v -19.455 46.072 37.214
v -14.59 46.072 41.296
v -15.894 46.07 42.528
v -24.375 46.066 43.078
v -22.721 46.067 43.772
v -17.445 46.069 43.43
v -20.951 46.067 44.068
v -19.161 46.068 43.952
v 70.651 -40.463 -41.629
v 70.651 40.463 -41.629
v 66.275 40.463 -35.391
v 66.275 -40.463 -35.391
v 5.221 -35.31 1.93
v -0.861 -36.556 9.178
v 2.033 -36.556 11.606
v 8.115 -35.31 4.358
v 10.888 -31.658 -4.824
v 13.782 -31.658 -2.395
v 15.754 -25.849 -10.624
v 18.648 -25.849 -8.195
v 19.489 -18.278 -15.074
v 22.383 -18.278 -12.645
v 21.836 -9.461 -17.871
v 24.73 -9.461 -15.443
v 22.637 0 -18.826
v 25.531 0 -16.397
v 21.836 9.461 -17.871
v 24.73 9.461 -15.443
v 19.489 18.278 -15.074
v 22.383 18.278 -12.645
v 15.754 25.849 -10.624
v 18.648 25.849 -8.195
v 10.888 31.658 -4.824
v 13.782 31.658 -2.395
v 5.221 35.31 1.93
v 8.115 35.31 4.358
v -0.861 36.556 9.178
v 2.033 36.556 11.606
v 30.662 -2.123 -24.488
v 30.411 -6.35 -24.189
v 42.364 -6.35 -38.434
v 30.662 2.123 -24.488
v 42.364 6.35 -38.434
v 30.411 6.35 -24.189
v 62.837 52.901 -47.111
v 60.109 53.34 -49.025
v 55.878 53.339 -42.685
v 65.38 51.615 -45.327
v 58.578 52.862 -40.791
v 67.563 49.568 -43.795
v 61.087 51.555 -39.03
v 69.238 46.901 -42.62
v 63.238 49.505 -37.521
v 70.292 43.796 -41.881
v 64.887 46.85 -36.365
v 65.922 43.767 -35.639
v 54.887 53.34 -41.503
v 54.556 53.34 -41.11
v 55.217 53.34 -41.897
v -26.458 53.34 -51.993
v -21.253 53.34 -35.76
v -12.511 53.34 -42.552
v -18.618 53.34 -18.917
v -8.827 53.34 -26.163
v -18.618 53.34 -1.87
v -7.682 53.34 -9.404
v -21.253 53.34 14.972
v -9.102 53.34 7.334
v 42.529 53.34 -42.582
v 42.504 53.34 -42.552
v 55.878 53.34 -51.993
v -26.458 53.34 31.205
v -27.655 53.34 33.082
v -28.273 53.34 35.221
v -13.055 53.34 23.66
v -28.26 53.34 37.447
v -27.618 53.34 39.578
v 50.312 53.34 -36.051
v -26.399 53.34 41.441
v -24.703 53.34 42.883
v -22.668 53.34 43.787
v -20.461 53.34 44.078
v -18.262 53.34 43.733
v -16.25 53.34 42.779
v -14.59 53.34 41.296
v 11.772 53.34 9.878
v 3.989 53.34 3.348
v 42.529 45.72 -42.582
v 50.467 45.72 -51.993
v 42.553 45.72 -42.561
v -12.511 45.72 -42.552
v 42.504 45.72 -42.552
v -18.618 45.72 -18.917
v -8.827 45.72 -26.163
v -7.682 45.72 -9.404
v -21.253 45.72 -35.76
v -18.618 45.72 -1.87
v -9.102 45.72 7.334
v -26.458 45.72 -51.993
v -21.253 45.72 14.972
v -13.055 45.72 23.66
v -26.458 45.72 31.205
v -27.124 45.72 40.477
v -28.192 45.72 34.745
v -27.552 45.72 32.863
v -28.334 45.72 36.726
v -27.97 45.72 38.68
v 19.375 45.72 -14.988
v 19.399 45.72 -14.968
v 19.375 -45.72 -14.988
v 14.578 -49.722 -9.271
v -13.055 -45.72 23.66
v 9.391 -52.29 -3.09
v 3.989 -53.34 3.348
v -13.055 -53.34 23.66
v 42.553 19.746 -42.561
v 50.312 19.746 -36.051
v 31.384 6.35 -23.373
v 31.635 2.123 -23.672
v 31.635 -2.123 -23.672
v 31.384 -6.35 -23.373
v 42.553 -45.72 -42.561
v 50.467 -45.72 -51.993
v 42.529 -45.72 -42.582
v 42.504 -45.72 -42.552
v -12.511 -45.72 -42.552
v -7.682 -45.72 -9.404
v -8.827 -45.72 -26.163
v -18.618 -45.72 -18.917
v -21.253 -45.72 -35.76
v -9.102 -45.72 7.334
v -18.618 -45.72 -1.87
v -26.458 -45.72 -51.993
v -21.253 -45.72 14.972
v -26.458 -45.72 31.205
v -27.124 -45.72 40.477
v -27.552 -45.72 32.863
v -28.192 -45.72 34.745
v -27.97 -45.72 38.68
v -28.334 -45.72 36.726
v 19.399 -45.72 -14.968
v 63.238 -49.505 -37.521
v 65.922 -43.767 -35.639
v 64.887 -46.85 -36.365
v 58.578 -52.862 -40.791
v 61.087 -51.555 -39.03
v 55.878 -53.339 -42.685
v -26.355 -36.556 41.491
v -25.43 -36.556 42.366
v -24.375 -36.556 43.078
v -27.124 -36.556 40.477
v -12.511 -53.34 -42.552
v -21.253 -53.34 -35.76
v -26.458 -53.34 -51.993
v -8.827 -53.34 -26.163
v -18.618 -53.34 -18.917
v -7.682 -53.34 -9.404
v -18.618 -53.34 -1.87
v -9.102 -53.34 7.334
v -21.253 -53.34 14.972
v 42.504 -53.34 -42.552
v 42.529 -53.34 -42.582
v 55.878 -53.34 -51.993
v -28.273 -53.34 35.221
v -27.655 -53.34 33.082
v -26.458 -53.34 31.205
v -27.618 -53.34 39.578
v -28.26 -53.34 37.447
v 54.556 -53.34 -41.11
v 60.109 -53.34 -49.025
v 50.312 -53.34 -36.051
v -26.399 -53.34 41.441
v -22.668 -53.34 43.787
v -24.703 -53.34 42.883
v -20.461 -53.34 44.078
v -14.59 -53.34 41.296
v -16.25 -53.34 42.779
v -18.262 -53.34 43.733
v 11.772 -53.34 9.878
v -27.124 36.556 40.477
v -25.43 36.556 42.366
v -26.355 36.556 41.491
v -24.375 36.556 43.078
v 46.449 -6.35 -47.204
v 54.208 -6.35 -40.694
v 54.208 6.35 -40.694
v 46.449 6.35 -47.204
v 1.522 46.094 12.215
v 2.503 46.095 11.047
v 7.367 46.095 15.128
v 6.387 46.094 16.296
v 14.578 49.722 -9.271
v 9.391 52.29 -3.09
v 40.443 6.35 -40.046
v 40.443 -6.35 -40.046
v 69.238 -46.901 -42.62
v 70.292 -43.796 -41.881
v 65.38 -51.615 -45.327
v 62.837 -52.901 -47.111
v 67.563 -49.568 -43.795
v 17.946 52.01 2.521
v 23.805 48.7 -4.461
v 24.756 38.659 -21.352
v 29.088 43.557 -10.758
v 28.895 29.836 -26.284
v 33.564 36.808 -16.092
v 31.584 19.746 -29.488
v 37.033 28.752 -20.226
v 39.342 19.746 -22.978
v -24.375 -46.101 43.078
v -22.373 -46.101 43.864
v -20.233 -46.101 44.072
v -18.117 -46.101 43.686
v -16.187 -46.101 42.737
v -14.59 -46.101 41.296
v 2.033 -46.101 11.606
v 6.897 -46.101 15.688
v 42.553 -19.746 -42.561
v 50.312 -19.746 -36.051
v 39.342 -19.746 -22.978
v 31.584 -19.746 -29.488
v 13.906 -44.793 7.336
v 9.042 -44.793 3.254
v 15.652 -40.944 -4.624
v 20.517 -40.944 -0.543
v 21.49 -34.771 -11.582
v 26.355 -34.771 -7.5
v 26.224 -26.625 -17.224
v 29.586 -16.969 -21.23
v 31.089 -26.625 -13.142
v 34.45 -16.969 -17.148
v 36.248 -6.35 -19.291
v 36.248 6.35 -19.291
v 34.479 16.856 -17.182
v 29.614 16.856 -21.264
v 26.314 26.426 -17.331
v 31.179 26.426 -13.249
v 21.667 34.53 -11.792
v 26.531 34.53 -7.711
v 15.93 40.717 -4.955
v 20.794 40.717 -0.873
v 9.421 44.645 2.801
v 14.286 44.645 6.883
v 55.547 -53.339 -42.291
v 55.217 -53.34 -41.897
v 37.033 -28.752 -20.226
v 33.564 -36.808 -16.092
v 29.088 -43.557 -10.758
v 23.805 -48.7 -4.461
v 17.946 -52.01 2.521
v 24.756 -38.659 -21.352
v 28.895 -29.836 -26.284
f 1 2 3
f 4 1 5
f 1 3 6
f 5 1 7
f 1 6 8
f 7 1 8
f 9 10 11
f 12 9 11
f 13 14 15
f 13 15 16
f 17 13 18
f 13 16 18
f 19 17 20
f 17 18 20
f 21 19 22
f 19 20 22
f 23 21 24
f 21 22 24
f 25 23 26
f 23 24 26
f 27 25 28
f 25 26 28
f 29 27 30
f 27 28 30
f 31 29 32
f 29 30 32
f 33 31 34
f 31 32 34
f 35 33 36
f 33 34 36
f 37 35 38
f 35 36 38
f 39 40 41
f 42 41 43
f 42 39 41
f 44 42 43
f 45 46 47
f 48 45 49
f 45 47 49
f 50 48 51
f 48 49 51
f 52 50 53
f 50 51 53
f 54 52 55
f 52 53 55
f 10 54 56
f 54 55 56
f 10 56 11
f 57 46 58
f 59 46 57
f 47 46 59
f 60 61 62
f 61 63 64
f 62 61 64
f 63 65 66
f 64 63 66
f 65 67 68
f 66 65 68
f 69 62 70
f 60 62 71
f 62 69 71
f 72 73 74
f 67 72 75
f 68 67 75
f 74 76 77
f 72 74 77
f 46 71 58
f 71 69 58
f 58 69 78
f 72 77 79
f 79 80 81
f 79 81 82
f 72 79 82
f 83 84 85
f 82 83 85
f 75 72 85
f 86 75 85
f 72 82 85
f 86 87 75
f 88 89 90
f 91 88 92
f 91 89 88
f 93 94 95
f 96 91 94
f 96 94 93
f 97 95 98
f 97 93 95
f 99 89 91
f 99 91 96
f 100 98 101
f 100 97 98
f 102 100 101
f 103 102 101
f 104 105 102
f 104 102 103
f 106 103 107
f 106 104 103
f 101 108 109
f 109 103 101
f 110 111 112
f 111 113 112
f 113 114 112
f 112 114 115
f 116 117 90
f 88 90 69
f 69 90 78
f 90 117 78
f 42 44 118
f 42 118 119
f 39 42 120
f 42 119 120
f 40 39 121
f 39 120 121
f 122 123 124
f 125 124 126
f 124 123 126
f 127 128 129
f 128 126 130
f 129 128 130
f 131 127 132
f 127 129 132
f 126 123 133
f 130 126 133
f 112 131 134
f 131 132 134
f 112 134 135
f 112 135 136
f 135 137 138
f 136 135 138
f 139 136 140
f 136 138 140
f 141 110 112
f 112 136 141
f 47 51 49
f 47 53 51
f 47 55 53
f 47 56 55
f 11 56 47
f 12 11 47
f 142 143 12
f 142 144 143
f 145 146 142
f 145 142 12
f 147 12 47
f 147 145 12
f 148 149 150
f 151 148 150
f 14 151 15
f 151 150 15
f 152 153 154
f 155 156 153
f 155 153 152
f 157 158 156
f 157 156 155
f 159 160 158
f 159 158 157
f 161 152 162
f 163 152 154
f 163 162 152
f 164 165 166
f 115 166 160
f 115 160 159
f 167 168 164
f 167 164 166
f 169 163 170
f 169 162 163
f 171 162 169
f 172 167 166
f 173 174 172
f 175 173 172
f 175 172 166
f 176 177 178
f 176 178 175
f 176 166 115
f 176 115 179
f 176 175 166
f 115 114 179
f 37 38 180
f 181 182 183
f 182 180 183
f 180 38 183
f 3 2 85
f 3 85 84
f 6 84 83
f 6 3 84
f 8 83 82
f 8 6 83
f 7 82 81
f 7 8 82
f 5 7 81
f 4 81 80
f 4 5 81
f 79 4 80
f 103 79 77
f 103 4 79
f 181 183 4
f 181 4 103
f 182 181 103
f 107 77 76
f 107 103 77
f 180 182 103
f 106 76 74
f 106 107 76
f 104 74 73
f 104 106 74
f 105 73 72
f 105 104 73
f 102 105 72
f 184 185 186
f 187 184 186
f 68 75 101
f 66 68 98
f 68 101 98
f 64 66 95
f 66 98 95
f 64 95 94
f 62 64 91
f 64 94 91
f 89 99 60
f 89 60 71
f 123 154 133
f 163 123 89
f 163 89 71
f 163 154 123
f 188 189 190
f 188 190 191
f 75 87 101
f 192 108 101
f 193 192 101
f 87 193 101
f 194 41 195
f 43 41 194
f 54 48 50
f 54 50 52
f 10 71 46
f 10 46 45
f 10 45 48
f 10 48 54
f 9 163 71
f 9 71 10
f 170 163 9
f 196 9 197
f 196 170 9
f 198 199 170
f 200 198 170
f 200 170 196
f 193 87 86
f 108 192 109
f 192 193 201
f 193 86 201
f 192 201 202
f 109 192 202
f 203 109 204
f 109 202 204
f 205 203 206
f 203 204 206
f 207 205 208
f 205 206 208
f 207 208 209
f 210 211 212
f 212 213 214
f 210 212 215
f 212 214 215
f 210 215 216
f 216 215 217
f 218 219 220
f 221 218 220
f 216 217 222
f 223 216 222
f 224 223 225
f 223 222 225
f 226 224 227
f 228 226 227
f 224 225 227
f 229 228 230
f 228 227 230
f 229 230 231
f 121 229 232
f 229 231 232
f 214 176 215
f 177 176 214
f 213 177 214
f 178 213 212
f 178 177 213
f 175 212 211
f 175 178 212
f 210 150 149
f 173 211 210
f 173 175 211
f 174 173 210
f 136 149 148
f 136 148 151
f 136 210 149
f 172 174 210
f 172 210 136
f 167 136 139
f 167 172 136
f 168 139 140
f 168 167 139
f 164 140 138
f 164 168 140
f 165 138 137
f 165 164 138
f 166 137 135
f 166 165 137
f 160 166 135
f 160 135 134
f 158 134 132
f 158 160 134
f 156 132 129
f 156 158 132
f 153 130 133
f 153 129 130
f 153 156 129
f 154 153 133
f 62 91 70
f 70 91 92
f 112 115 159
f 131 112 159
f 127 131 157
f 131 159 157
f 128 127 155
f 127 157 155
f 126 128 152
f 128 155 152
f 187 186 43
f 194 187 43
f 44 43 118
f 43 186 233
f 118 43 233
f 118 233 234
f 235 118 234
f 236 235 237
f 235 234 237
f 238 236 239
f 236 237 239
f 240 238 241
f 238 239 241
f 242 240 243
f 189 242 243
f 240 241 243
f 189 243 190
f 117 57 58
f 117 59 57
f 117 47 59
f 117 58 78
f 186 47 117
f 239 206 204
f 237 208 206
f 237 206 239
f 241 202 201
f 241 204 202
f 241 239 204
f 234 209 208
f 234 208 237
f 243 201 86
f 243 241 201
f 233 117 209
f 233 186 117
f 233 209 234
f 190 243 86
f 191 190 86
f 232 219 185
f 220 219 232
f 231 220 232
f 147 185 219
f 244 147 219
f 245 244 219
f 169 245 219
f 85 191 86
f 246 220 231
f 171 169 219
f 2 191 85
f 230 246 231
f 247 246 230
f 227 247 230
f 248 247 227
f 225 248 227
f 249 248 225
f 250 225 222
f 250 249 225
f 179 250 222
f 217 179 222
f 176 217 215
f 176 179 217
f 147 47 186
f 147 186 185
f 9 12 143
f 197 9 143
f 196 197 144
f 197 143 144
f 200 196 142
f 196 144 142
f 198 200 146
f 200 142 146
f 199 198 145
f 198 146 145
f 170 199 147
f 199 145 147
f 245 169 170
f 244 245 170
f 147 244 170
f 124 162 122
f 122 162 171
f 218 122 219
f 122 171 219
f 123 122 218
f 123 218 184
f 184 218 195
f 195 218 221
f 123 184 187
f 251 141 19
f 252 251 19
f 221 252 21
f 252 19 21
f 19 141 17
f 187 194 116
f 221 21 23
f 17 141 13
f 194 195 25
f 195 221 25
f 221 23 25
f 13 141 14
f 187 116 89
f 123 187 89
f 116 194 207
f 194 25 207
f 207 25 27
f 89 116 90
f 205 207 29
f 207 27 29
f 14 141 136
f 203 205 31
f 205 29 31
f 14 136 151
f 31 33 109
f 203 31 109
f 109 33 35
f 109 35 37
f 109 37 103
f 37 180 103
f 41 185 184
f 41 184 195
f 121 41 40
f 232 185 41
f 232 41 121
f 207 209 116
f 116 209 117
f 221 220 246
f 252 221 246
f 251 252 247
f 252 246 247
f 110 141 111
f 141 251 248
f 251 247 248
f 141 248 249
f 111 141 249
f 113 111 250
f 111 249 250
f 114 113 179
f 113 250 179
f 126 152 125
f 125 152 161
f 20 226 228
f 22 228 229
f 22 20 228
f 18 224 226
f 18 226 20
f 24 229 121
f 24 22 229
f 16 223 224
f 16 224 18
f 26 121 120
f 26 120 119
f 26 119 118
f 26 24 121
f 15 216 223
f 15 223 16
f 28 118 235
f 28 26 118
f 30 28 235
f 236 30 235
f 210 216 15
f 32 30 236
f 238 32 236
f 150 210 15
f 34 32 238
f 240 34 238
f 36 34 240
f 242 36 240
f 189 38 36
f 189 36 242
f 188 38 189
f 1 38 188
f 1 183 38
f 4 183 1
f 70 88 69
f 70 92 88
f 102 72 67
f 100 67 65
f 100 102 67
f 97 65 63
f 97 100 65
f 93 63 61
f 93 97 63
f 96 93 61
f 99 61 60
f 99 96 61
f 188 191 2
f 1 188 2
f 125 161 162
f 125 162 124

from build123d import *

# Parameters (mm, degrees)
F1_DEPTH  = 53.34
F2_W      = 9.5451793726
F2_H      = 32.1946403572
F3_DEPTH  = 6.35
F2_W_2    = 12.7
F2_H_2    = 9.3445232351
F4_DEPTH  = 7.62
F6_DEPTH  = 106.68
F8_W      = 91.44
F8_H      = 183.6228075896
F9_DEPTH  = 58.928
F10_DEPTH = 25.4
F11_DEPTH = 70.503420446
F12_R     = 12.8774151417
F13_DEPTH = 10.16


# Not quite as in the source:
# - a feature names something its author has since deleted; it is built from what else it names


with BuildPart() as f1:
    # F0 (on Front) → F1 (new body, symmetric)
    with BuildSketch(Plane.XZ):
        with BuildLine():
            ThreePointArc((-26.4580316219, 31.2050478526), (-18.2875299748, -10.3937397156), (-26.4580316219, -51.9925272838))
            Line((-26.4580316219, -51.9925272838), (55.8778569108, -51.9925272838))
            Line((55.8778569108, -51.9925272838), (70.650836429, -41.6293909539))
            Line((70.650836429, -41.6293909539), (66.2748063527, -35.3912212887))
            Line((66.2748063527, -35.3912212887), (55.8778569108, -42.6846047493))
            Line((55.8778569108, -42.6846047493), (-14.5902915946, 41.2960643955))
            ThreePointArc((-14.5902915946, 41.2960643955), (-25.6027276184, 42.2233043466), (-26.4580316219, 31.2050478526))
        make_face()
    extrude(amount=F1_DEPTH, both=True)

    # F2 (on face) → F3 (cut)
    with BuildSketch(Plane(origin=(11.772407622, 0, 9.8782228937), x_dir=(0, 1, 0), z_dir=(0.7660444431, 0, 0.6427876097))):
        with BuildLine():
            ThreePointArc((-36.5558206274, 35.6727858321), (-43.6495251277, 22.4172118106), (-46.101, 7.584101647))
            Line((-46.101, 7.584101647), (-36.5558206274, 7.584101647))
            Line((-36.5558206274, 7.584101647), (-36.5558206274, 35.6727858321))
        make_face()
        with BuildLine():
            Line((36.5558206274, 41.0130793115), (36.5558206274, 35.6727858321))
            ThreePointArc((36.5558206274, 35.6727858321), (43.5201114475, 22.7927209334), (46.0941562407, 8.3784324728))
            Line((46.0941562407, 8.3784324728), (46.0716254282, 41.0130793115))
            Line((46.0716254282, 41.0130793115), (36.5558206274, 41.0130793115))
        make_face()
        with BuildLine():
            Line((-36.5558206274, 41.0130793115), (-31.7459549124, 41.0130793115))
            ThreePointArc((-31.7459549124, 41.0130793115), (-17.0908294369, 50.4000536994), (0, 53.685101647))
            Line((0, 53.685101647), (0, 73.2077196687))
            Line((0, 73.2077196687), (-36.5558206274, 73.2077196687))
            Line((-36.5558206274, 73.2077196687), (-36.5558206274, 41.0130793115))
        make_face()
        with Locations((-41.3284103137, 57.1103994901)):
            Rectangle(F2_W, F2_H)
        Polygon((36.5558206274, 73.1040577223), (36.5558206274, 41.0130793115), (46.0716254282, 41.0130793115), (46.0494885484, 73.0771363708), align=None)
        with BuildLine():
            ThreePointArc((0, 53.685101647), (-17.0908294369, 50.4000536994), (-31.7459549124, 41.0130793115))
            Line((-31.7459549124, 41.0130793115), (-14.7929535268, 41.0130793115))
            ThreePointArc((-14.7929535268, 41.0130793115), (-7.5599044465, 43.3496698167), (0, 44.1399222744))
            Line((0, 44.1399222744), (0, 53.685101647))
        make_face()
        with BuildLine():
            ThreePointArc((31.7459549124, 41.0130793115), (17.0908294369, 50.4000536994), (0, 53.685101647))
            Line((0, 53.685101647), (0, 44.1399222744))
            ThreePointArc((0, 44.1399222744), (7.5599044465, 43.3496698167), (14.7929535268, 41.0130793115))
            Line((14.7929535268, 41.0130793115), (31.7459549124, 41.0130793115))
        make_face()
        with BuildLine():
            Line((-46.101, 41.0130793115), (-46.101, 7.584101647))
            ThreePointArc((-46.101, 7.584101647), (-43.6495251277, 22.4172118106), (-36.5558206274, 35.6727858321))
            Line((-36.5558206274, 35.6727858321), (-36.5558206274, 41.0130793115))
            Line((-36.5558206274, 41.0130793115), (-46.101, 41.0130793115))
        make_face()
        with BuildLine():
            Line((0, 73.2077196687), (0, 53.685101647))
            ThreePointArc((0, 53.685101647), (17.0908294369, 50.4000536994), (31.7459549124, 41.0130793115))
            Line((31.7459549124, 41.0130793115), (36.5558206274, 41.0130793115))
            Line((36.5558206274, 41.0130793115), (36.5558206274, 73.1040577223))
            Line((36.5558206274, 73.1040577223), (0, 73.2077196687))
        make_face()
        with BuildLine():
            Line((-36.5558206274, 41.0130793115), (-36.5558206274, 35.6727858321))
            ThreePointArc((-36.5558206274, 35.6727858321), (-34.2551137655, 38.4368062596), (-31.7459549124, 41.0130793115))
            Line((-31.7459549124, 41.0130793115), (-36.5558206274, 41.0130793115))
        make_face()
        with BuildLine():
            ThreePointArc((-31.7459549124, 41.0130793115), (-34.2551137655, 38.4368062596), (-36.5558206274, 35.6727858321))
            Line((-36.5558206274, 35.6727858321), (-36.5558206274, 7.584101647))
            ThreePointArc((-36.5558206274, 7.584101647), (-30.635735485, 27.5285177335), (-14.7929535268, 41.0130793115))
            Line((-14.7929535268, 41.0130793115), (-31.7459549124, 41.0130793115))
        make_face()
        with BuildLine():
            ThreePointArc((14.7929535268, 41.0130793115), (30.635735485, 27.5285177335), (36.5558206274, 7.584101647))
            Line((36.5558206274, 7.584101647), (36.5558206274, 35.6727858321))
            ThreePointArc((36.5558206274, 35.6727858321), (34.2551137655, 38.4368062596), (31.7459549124, 41.0130793115))
            Line((31.7459549124, 41.0130793115), (14.7929535268, 41.0130793115))
        make_face()
        with BuildLine():
            Line((-36.5558206274, 7.584101647), (-46.101, 7.584101647))
            ThreePointArc((-46.101, 7.584101647), (-34.7709904302, -22.686022659), (-6.35, -38.0774763043))
            ThreePointArc((-6.35, -38.0774763043), (0, -38.516898353), (6.35, -38.0774763043))
            ThreePointArc((6.35, -38.0774763043), (34.5300058488, -22.9606343493), (46.0952091038, 6.8534179416))
            Line((46.0952091038, 6.8534179416), (46.0941562407, 8.3784324728))
            ThreePointArc((46.0941562407, 8.3784324728), (43.5201114475, 22.7927209334), (36.5558206274, 35.6727858321))
            Line((36.5558206274, 35.6727858321), (36.5558206274, 7.584101647))
            ThreePointArc((36.5558206274, 7.584101647), (0, -28.9717189805), (-36.5558206274, 7.584101647))
        make_face()
        with BuildLine():
            Line((0, 7.584101647), (-36.5558206274, 7.584101647))
            ThreePointArc((-36.5558206274, 7.584101647), (0, -28.9717189805), (36.5558206274, 7.584101647))
            ThreePointArc((36.5558206274, 7.584101647), (30.635735485, 27.5285177335), (14.7929535268, 41.0130793115))
            Line((14.7929535268, 41.0130793115), (0, 41.0130793115))
            Line((0, 41.0130793115), (0, 7.584101647))
        make_face()
        with BuildLine():
            ThreePointArc((-14.7929535268, 41.0130793115), (-30.635735485, 27.5285177335), (-36.5558206274, 7.584101647))
            Line((-36.5558206274, 7.584101647), (0, 7.584101647))
            Line((0, 7.584101647), (0, 41.0130793115))
            Line((0, 41.0130793115), (-14.7929535268, 41.0130793115))
        make_face()
        with BuildLine():
            ThreePointArc((31.7459549124, 41.0130793115), (34.2551137655, 38.4368062596), (36.5558206274, 35.6727858321))
            Line((36.5558206274, 35.6727858321), (36.5558206274, 41.0130793115))
            Line((36.5558206274, 41.0130793115), (31.7459549124, 41.0130793115))
        make_face()
    extrude(amount=-F3_DEPTH, mode=Mode.SUBTRACT)

    # F2 (on face) → F4 (cut)
    with BuildSketch(Plane(origin=(11.772407622, 0, 9.8782228937), x_dir=(0, 1, 0), z_dir=(0.7660444431, 0, 0.6427876097))):
        with BuildLine():
            ThreePointArc((6.35, -38.0774763043), (0, -38.516898353), (-6.35, -38.0774763043))
            Line((-6.35, -38.0774763043), (-6.35, -56.6729530692))
            Line((-6.35, -56.6729530692), (6.35, -56.6729530692))
            Line((6.35, -56.6729530692), (6.35, -38.0774763043))
        make_face()
        with Locations((0, -61.3452146868)):
            Rectangle(F2_W_2, F2_H_2)
    extrude(amount=-F4_DEPTH, mode=Mode.SUBTRACT)

    # F5 (on face) → F6 (cut, through all)
    with BuildSketch(Plane.XZ.offset(53.34)):
        with BuildLine():
            Line((42.5035902841, -42.5519285295), (-13.0547319913, 23.6599016408))
            ThreePointArc((-13.0547319913, 23.6599016408), (-7.6819414216, -9.4041517757), (-12.5113723521, -42.5519285295))
            Line((-12.5113723521, -42.5519285295), (42.5035902841, -42.5519285295))
        make_face()
    extrude(amount=-F6_DEPTH, mode=Mode.SUBTRACT)

    # F8 (on face) → F9 (cut)
    with BuildSketch(Plane(origin=(-41.1275322828, 0, -34.5100971697), x_dir=(0, 1, 0), z_dir=(0.7660444431, 0, 0.6427876097))):
        with Locations((0, -8.2484856248)):
            Rectangle(F8_W, F8_H)
    extrude(amount=F9_DEPTH, mode=Mode.SUBTRACT)

    # F2 (on face) → F10 (cut)
    with BuildSketch(Plane(origin=(11.772407622, 0, 9.8782228937), x_dir=(0, 1, 0), z_dir=(0.7660444431, 0, 0.6427876097))):
        with BuildLine():
            ThreePointArc((-14.7929535268, 41.0130793115), (-30.635735485, 27.5285177335), (-36.5558206274, 7.584101647))
            Line((-36.5558206274, 7.584101647), (0, 7.584101647))
            Line((0, 7.584101647), (0, 41.0130793115))
            Line((0, 41.0130793115), (-14.7929535268, 41.0130793115))
        make_face()
        with BuildLine():
            Line((0, 7.584101647), (-36.5558206274, 7.584101647))
            ThreePointArc((-36.5558206274, 7.584101647), (0, -28.9717189805), (36.5558206274, 7.584101647))
            ThreePointArc((36.5558206274, 7.584101647), (30.635735485, 27.5285177335), (14.7929535268, 41.0130793115))
            Line((14.7929535268, 41.0130793115), (0, 41.0130793115))
            Line((0, 41.0130793115), (0, 7.584101647))
        make_face()
        with BuildLine():
            ThreePointArc((-31.7459549124, 41.0130793115), (-34.2551137655, 38.4368062596), (-36.5558206274, 35.6727858321))
            Line((-36.5558206274, 35.6727858321), (-36.5558206274, 7.584101647))
            ThreePointArc((-36.5558206274, 7.584101647), (-30.635735485, 27.5285177335), (-14.7929535268, 41.0130793115))
            Line((-14.7929535268, 41.0130793115), (-31.7459549124, 41.0130793115))
        make_face()
        with BuildLine():
            ThreePointArc((14.7929535268, 41.0130793115), (30.635735485, 27.5285177335), (36.5558206274, 7.584101647))
            Line((36.5558206274, 7.584101647), (36.5558206274, 35.6727858321))
            ThreePointArc((36.5558206274, 35.6727858321), (34.2551137655, 38.4368062596), (31.7459549124, 41.0130793115))
            Line((31.7459549124, 41.0130793115), (14.7929535268, 41.0130793115))
        make_face()
        with BuildLine():
            ThreePointArc((31.7459549124, 41.0130793115), (17.0908294369, 50.4000536994), (0, 53.685101647))
            Line((0, 53.685101647), (0, 44.1399222744))
            ThreePointArc((0, 44.1399222744), (7.5599044465, 43.3496698167), (14.7929535268, 41.0130793115))
            Line((14.7929535268, 41.0130793115), (31.7459549124, 41.0130793115))
        make_face()
        with BuildLine():
            ThreePointArc((0, 53.685101647), (-17.0908294369, 50.4000536994), (-31.7459549124, 41.0130793115))
            Line((-31.7459549124, 41.0130793115), (-14.7929535268, 41.0130793115))
            ThreePointArc((-14.7929535268, 41.0130793115), (-7.5599044465, 43.3496698167), (0, 44.1399222744))
            Line((0, 44.1399222744), (0, 53.685101647))
        make_face()
        with BuildLine():
            Line((-36.5558206274, 41.0130793115), (-31.7459549124, 41.0130793115))
            ThreePointArc((-31.7459549124, 41.0130793115), (-17.0908294369, 50.4000536994), (0, 53.685101647))
            Line((0, 53.685101647), (0, 73.2077196687))
            Line((0, 73.2077196687), (-36.5558206274, 73.2077196687))
            Line((-36.5558206274, 73.2077196687), (-36.5558206274, 41.0130793115))
        make_face()
        with BuildLine():
            Line((-36.5558206274, 41.0130793115), (-36.5558206274, 35.6727858321))
            ThreePointArc((-36.5558206274, 35.6727858321), (-34.2551137655, 38.4368062596), (-31.7459549124, 41.0130793115))
            Line((-31.7459549124, 41.0130793115), (-36.5558206274, 41.0130793115))
        make_face()
        with BuildLine():
            Line((0, 73.2077196687), (0, 53.685101647))
            ThreePointArc((0, 53.685101647), (17.0908294369, 50.4000536994), (31.7459549124, 41.0130793115))
            Line((31.7459549124, 41.0130793115), (36.5558206274, 41.0130793115))
            Line((36.5558206274, 41.0130793115), (36.5558206274, 73.1040577223))
            Line((36.5558206274, 73.1040577223), (0, 73.2077196687))
        make_face()
        with BuildLine():
            ThreePointArc((31.7459549124, 41.0130793115), (34.2551137655, 38.4368062596), (36.5558206274, 35.6727858321))
            Line((36.5558206274, 35.6727858321), (36.5558206274, 41.0130793115))
            Line((36.5558206274, 41.0130793115), (31.7459549124, 41.0130793115))
        make_face()
        with BuildLine():
            Line((0, 44.1399222744), (0, 41.0130793115))
            Line((0, 41.0130793115), (14.7929535268, 41.0130793115))
            ThreePointArc((14.7929535268, 41.0130793115), (7.5599044465, 43.3496698167), (0, 44.1399222744))
        make_face()
        with BuildLine():
            ThreePointArc((0, 44.1399222744), (-7.5599044465, 43.3496698167), (-14.7929535268, 41.0130793115))
            Line((-14.7929535268, 41.0130793115), (0, 41.0130793115))
            Line((0, 41.0130793115), (0, 44.1399222744))
        make_face()
    extrude(amount=-F10_DEPTH, mode=Mode.SUBTRACT)

    # F2 (on face) → F11 (cut, through all)
    with BuildSketch(Plane(origin=(11.772407622, 0, 9.8782228937), x_dir=(0, 1, 0), z_dir=(0.7660444431, 0, 0.6427876097))):
        with Locations((0, -61.3452146868)):
            Rectangle(F2_W_2, F2_H_2)
    extrude(amount=-F11_DEPTH, mode=Mode.SUBTRACT)

    # F12
    f12_edges = [f1.edges().sort_by_distance(p)[0] for p in [
        (68.462821, -53.34, -38.510306),
        (68.462821, 53.34, -38.510306),
    ]]
    fillet(f12_edges, radius=F12_R)

    # F2 (on face) → F13 (cut)
    with BuildSketch(Plane(origin=(11.772407622, 0, 9.8782228937), x_dir=(0, 1, 0), z_dir=(0.7660444431, 0, 0.6427876097))):
        with BuildLine():
            ThreePointArc((-19.7458926348, -42.8908065921), (-43.5565376092, -26.93877956), (-53.34, 0))
            Line((-53.34, 0), (-53.34, -59.9567629397))
            Line((-53.34, -59.9567629397), (-19.7458926348, -59.9567629397))
            Line((-19.7458926348, -59.9567629397), (-19.7458926348, -42.8908065921))
        make_face()
        with BuildLine():
            Line((53.34, -59.9567629397), (53.34, 0))
            ThreePointArc((53.34, 0), (43.5565376092, -26.93877956), (19.7458926348, -42.8908065921))
            Line((19.7458926348, -42.8908065921), (19.7458926348, -59.9567629397))
            Line((19.7458926348, -59.9567629397), (53.34, -59.9567629397))
        make_face()
    extrude(amount=-F13_DEPTH, mode=Mode.SUBTRACT)


solid = f1.part
